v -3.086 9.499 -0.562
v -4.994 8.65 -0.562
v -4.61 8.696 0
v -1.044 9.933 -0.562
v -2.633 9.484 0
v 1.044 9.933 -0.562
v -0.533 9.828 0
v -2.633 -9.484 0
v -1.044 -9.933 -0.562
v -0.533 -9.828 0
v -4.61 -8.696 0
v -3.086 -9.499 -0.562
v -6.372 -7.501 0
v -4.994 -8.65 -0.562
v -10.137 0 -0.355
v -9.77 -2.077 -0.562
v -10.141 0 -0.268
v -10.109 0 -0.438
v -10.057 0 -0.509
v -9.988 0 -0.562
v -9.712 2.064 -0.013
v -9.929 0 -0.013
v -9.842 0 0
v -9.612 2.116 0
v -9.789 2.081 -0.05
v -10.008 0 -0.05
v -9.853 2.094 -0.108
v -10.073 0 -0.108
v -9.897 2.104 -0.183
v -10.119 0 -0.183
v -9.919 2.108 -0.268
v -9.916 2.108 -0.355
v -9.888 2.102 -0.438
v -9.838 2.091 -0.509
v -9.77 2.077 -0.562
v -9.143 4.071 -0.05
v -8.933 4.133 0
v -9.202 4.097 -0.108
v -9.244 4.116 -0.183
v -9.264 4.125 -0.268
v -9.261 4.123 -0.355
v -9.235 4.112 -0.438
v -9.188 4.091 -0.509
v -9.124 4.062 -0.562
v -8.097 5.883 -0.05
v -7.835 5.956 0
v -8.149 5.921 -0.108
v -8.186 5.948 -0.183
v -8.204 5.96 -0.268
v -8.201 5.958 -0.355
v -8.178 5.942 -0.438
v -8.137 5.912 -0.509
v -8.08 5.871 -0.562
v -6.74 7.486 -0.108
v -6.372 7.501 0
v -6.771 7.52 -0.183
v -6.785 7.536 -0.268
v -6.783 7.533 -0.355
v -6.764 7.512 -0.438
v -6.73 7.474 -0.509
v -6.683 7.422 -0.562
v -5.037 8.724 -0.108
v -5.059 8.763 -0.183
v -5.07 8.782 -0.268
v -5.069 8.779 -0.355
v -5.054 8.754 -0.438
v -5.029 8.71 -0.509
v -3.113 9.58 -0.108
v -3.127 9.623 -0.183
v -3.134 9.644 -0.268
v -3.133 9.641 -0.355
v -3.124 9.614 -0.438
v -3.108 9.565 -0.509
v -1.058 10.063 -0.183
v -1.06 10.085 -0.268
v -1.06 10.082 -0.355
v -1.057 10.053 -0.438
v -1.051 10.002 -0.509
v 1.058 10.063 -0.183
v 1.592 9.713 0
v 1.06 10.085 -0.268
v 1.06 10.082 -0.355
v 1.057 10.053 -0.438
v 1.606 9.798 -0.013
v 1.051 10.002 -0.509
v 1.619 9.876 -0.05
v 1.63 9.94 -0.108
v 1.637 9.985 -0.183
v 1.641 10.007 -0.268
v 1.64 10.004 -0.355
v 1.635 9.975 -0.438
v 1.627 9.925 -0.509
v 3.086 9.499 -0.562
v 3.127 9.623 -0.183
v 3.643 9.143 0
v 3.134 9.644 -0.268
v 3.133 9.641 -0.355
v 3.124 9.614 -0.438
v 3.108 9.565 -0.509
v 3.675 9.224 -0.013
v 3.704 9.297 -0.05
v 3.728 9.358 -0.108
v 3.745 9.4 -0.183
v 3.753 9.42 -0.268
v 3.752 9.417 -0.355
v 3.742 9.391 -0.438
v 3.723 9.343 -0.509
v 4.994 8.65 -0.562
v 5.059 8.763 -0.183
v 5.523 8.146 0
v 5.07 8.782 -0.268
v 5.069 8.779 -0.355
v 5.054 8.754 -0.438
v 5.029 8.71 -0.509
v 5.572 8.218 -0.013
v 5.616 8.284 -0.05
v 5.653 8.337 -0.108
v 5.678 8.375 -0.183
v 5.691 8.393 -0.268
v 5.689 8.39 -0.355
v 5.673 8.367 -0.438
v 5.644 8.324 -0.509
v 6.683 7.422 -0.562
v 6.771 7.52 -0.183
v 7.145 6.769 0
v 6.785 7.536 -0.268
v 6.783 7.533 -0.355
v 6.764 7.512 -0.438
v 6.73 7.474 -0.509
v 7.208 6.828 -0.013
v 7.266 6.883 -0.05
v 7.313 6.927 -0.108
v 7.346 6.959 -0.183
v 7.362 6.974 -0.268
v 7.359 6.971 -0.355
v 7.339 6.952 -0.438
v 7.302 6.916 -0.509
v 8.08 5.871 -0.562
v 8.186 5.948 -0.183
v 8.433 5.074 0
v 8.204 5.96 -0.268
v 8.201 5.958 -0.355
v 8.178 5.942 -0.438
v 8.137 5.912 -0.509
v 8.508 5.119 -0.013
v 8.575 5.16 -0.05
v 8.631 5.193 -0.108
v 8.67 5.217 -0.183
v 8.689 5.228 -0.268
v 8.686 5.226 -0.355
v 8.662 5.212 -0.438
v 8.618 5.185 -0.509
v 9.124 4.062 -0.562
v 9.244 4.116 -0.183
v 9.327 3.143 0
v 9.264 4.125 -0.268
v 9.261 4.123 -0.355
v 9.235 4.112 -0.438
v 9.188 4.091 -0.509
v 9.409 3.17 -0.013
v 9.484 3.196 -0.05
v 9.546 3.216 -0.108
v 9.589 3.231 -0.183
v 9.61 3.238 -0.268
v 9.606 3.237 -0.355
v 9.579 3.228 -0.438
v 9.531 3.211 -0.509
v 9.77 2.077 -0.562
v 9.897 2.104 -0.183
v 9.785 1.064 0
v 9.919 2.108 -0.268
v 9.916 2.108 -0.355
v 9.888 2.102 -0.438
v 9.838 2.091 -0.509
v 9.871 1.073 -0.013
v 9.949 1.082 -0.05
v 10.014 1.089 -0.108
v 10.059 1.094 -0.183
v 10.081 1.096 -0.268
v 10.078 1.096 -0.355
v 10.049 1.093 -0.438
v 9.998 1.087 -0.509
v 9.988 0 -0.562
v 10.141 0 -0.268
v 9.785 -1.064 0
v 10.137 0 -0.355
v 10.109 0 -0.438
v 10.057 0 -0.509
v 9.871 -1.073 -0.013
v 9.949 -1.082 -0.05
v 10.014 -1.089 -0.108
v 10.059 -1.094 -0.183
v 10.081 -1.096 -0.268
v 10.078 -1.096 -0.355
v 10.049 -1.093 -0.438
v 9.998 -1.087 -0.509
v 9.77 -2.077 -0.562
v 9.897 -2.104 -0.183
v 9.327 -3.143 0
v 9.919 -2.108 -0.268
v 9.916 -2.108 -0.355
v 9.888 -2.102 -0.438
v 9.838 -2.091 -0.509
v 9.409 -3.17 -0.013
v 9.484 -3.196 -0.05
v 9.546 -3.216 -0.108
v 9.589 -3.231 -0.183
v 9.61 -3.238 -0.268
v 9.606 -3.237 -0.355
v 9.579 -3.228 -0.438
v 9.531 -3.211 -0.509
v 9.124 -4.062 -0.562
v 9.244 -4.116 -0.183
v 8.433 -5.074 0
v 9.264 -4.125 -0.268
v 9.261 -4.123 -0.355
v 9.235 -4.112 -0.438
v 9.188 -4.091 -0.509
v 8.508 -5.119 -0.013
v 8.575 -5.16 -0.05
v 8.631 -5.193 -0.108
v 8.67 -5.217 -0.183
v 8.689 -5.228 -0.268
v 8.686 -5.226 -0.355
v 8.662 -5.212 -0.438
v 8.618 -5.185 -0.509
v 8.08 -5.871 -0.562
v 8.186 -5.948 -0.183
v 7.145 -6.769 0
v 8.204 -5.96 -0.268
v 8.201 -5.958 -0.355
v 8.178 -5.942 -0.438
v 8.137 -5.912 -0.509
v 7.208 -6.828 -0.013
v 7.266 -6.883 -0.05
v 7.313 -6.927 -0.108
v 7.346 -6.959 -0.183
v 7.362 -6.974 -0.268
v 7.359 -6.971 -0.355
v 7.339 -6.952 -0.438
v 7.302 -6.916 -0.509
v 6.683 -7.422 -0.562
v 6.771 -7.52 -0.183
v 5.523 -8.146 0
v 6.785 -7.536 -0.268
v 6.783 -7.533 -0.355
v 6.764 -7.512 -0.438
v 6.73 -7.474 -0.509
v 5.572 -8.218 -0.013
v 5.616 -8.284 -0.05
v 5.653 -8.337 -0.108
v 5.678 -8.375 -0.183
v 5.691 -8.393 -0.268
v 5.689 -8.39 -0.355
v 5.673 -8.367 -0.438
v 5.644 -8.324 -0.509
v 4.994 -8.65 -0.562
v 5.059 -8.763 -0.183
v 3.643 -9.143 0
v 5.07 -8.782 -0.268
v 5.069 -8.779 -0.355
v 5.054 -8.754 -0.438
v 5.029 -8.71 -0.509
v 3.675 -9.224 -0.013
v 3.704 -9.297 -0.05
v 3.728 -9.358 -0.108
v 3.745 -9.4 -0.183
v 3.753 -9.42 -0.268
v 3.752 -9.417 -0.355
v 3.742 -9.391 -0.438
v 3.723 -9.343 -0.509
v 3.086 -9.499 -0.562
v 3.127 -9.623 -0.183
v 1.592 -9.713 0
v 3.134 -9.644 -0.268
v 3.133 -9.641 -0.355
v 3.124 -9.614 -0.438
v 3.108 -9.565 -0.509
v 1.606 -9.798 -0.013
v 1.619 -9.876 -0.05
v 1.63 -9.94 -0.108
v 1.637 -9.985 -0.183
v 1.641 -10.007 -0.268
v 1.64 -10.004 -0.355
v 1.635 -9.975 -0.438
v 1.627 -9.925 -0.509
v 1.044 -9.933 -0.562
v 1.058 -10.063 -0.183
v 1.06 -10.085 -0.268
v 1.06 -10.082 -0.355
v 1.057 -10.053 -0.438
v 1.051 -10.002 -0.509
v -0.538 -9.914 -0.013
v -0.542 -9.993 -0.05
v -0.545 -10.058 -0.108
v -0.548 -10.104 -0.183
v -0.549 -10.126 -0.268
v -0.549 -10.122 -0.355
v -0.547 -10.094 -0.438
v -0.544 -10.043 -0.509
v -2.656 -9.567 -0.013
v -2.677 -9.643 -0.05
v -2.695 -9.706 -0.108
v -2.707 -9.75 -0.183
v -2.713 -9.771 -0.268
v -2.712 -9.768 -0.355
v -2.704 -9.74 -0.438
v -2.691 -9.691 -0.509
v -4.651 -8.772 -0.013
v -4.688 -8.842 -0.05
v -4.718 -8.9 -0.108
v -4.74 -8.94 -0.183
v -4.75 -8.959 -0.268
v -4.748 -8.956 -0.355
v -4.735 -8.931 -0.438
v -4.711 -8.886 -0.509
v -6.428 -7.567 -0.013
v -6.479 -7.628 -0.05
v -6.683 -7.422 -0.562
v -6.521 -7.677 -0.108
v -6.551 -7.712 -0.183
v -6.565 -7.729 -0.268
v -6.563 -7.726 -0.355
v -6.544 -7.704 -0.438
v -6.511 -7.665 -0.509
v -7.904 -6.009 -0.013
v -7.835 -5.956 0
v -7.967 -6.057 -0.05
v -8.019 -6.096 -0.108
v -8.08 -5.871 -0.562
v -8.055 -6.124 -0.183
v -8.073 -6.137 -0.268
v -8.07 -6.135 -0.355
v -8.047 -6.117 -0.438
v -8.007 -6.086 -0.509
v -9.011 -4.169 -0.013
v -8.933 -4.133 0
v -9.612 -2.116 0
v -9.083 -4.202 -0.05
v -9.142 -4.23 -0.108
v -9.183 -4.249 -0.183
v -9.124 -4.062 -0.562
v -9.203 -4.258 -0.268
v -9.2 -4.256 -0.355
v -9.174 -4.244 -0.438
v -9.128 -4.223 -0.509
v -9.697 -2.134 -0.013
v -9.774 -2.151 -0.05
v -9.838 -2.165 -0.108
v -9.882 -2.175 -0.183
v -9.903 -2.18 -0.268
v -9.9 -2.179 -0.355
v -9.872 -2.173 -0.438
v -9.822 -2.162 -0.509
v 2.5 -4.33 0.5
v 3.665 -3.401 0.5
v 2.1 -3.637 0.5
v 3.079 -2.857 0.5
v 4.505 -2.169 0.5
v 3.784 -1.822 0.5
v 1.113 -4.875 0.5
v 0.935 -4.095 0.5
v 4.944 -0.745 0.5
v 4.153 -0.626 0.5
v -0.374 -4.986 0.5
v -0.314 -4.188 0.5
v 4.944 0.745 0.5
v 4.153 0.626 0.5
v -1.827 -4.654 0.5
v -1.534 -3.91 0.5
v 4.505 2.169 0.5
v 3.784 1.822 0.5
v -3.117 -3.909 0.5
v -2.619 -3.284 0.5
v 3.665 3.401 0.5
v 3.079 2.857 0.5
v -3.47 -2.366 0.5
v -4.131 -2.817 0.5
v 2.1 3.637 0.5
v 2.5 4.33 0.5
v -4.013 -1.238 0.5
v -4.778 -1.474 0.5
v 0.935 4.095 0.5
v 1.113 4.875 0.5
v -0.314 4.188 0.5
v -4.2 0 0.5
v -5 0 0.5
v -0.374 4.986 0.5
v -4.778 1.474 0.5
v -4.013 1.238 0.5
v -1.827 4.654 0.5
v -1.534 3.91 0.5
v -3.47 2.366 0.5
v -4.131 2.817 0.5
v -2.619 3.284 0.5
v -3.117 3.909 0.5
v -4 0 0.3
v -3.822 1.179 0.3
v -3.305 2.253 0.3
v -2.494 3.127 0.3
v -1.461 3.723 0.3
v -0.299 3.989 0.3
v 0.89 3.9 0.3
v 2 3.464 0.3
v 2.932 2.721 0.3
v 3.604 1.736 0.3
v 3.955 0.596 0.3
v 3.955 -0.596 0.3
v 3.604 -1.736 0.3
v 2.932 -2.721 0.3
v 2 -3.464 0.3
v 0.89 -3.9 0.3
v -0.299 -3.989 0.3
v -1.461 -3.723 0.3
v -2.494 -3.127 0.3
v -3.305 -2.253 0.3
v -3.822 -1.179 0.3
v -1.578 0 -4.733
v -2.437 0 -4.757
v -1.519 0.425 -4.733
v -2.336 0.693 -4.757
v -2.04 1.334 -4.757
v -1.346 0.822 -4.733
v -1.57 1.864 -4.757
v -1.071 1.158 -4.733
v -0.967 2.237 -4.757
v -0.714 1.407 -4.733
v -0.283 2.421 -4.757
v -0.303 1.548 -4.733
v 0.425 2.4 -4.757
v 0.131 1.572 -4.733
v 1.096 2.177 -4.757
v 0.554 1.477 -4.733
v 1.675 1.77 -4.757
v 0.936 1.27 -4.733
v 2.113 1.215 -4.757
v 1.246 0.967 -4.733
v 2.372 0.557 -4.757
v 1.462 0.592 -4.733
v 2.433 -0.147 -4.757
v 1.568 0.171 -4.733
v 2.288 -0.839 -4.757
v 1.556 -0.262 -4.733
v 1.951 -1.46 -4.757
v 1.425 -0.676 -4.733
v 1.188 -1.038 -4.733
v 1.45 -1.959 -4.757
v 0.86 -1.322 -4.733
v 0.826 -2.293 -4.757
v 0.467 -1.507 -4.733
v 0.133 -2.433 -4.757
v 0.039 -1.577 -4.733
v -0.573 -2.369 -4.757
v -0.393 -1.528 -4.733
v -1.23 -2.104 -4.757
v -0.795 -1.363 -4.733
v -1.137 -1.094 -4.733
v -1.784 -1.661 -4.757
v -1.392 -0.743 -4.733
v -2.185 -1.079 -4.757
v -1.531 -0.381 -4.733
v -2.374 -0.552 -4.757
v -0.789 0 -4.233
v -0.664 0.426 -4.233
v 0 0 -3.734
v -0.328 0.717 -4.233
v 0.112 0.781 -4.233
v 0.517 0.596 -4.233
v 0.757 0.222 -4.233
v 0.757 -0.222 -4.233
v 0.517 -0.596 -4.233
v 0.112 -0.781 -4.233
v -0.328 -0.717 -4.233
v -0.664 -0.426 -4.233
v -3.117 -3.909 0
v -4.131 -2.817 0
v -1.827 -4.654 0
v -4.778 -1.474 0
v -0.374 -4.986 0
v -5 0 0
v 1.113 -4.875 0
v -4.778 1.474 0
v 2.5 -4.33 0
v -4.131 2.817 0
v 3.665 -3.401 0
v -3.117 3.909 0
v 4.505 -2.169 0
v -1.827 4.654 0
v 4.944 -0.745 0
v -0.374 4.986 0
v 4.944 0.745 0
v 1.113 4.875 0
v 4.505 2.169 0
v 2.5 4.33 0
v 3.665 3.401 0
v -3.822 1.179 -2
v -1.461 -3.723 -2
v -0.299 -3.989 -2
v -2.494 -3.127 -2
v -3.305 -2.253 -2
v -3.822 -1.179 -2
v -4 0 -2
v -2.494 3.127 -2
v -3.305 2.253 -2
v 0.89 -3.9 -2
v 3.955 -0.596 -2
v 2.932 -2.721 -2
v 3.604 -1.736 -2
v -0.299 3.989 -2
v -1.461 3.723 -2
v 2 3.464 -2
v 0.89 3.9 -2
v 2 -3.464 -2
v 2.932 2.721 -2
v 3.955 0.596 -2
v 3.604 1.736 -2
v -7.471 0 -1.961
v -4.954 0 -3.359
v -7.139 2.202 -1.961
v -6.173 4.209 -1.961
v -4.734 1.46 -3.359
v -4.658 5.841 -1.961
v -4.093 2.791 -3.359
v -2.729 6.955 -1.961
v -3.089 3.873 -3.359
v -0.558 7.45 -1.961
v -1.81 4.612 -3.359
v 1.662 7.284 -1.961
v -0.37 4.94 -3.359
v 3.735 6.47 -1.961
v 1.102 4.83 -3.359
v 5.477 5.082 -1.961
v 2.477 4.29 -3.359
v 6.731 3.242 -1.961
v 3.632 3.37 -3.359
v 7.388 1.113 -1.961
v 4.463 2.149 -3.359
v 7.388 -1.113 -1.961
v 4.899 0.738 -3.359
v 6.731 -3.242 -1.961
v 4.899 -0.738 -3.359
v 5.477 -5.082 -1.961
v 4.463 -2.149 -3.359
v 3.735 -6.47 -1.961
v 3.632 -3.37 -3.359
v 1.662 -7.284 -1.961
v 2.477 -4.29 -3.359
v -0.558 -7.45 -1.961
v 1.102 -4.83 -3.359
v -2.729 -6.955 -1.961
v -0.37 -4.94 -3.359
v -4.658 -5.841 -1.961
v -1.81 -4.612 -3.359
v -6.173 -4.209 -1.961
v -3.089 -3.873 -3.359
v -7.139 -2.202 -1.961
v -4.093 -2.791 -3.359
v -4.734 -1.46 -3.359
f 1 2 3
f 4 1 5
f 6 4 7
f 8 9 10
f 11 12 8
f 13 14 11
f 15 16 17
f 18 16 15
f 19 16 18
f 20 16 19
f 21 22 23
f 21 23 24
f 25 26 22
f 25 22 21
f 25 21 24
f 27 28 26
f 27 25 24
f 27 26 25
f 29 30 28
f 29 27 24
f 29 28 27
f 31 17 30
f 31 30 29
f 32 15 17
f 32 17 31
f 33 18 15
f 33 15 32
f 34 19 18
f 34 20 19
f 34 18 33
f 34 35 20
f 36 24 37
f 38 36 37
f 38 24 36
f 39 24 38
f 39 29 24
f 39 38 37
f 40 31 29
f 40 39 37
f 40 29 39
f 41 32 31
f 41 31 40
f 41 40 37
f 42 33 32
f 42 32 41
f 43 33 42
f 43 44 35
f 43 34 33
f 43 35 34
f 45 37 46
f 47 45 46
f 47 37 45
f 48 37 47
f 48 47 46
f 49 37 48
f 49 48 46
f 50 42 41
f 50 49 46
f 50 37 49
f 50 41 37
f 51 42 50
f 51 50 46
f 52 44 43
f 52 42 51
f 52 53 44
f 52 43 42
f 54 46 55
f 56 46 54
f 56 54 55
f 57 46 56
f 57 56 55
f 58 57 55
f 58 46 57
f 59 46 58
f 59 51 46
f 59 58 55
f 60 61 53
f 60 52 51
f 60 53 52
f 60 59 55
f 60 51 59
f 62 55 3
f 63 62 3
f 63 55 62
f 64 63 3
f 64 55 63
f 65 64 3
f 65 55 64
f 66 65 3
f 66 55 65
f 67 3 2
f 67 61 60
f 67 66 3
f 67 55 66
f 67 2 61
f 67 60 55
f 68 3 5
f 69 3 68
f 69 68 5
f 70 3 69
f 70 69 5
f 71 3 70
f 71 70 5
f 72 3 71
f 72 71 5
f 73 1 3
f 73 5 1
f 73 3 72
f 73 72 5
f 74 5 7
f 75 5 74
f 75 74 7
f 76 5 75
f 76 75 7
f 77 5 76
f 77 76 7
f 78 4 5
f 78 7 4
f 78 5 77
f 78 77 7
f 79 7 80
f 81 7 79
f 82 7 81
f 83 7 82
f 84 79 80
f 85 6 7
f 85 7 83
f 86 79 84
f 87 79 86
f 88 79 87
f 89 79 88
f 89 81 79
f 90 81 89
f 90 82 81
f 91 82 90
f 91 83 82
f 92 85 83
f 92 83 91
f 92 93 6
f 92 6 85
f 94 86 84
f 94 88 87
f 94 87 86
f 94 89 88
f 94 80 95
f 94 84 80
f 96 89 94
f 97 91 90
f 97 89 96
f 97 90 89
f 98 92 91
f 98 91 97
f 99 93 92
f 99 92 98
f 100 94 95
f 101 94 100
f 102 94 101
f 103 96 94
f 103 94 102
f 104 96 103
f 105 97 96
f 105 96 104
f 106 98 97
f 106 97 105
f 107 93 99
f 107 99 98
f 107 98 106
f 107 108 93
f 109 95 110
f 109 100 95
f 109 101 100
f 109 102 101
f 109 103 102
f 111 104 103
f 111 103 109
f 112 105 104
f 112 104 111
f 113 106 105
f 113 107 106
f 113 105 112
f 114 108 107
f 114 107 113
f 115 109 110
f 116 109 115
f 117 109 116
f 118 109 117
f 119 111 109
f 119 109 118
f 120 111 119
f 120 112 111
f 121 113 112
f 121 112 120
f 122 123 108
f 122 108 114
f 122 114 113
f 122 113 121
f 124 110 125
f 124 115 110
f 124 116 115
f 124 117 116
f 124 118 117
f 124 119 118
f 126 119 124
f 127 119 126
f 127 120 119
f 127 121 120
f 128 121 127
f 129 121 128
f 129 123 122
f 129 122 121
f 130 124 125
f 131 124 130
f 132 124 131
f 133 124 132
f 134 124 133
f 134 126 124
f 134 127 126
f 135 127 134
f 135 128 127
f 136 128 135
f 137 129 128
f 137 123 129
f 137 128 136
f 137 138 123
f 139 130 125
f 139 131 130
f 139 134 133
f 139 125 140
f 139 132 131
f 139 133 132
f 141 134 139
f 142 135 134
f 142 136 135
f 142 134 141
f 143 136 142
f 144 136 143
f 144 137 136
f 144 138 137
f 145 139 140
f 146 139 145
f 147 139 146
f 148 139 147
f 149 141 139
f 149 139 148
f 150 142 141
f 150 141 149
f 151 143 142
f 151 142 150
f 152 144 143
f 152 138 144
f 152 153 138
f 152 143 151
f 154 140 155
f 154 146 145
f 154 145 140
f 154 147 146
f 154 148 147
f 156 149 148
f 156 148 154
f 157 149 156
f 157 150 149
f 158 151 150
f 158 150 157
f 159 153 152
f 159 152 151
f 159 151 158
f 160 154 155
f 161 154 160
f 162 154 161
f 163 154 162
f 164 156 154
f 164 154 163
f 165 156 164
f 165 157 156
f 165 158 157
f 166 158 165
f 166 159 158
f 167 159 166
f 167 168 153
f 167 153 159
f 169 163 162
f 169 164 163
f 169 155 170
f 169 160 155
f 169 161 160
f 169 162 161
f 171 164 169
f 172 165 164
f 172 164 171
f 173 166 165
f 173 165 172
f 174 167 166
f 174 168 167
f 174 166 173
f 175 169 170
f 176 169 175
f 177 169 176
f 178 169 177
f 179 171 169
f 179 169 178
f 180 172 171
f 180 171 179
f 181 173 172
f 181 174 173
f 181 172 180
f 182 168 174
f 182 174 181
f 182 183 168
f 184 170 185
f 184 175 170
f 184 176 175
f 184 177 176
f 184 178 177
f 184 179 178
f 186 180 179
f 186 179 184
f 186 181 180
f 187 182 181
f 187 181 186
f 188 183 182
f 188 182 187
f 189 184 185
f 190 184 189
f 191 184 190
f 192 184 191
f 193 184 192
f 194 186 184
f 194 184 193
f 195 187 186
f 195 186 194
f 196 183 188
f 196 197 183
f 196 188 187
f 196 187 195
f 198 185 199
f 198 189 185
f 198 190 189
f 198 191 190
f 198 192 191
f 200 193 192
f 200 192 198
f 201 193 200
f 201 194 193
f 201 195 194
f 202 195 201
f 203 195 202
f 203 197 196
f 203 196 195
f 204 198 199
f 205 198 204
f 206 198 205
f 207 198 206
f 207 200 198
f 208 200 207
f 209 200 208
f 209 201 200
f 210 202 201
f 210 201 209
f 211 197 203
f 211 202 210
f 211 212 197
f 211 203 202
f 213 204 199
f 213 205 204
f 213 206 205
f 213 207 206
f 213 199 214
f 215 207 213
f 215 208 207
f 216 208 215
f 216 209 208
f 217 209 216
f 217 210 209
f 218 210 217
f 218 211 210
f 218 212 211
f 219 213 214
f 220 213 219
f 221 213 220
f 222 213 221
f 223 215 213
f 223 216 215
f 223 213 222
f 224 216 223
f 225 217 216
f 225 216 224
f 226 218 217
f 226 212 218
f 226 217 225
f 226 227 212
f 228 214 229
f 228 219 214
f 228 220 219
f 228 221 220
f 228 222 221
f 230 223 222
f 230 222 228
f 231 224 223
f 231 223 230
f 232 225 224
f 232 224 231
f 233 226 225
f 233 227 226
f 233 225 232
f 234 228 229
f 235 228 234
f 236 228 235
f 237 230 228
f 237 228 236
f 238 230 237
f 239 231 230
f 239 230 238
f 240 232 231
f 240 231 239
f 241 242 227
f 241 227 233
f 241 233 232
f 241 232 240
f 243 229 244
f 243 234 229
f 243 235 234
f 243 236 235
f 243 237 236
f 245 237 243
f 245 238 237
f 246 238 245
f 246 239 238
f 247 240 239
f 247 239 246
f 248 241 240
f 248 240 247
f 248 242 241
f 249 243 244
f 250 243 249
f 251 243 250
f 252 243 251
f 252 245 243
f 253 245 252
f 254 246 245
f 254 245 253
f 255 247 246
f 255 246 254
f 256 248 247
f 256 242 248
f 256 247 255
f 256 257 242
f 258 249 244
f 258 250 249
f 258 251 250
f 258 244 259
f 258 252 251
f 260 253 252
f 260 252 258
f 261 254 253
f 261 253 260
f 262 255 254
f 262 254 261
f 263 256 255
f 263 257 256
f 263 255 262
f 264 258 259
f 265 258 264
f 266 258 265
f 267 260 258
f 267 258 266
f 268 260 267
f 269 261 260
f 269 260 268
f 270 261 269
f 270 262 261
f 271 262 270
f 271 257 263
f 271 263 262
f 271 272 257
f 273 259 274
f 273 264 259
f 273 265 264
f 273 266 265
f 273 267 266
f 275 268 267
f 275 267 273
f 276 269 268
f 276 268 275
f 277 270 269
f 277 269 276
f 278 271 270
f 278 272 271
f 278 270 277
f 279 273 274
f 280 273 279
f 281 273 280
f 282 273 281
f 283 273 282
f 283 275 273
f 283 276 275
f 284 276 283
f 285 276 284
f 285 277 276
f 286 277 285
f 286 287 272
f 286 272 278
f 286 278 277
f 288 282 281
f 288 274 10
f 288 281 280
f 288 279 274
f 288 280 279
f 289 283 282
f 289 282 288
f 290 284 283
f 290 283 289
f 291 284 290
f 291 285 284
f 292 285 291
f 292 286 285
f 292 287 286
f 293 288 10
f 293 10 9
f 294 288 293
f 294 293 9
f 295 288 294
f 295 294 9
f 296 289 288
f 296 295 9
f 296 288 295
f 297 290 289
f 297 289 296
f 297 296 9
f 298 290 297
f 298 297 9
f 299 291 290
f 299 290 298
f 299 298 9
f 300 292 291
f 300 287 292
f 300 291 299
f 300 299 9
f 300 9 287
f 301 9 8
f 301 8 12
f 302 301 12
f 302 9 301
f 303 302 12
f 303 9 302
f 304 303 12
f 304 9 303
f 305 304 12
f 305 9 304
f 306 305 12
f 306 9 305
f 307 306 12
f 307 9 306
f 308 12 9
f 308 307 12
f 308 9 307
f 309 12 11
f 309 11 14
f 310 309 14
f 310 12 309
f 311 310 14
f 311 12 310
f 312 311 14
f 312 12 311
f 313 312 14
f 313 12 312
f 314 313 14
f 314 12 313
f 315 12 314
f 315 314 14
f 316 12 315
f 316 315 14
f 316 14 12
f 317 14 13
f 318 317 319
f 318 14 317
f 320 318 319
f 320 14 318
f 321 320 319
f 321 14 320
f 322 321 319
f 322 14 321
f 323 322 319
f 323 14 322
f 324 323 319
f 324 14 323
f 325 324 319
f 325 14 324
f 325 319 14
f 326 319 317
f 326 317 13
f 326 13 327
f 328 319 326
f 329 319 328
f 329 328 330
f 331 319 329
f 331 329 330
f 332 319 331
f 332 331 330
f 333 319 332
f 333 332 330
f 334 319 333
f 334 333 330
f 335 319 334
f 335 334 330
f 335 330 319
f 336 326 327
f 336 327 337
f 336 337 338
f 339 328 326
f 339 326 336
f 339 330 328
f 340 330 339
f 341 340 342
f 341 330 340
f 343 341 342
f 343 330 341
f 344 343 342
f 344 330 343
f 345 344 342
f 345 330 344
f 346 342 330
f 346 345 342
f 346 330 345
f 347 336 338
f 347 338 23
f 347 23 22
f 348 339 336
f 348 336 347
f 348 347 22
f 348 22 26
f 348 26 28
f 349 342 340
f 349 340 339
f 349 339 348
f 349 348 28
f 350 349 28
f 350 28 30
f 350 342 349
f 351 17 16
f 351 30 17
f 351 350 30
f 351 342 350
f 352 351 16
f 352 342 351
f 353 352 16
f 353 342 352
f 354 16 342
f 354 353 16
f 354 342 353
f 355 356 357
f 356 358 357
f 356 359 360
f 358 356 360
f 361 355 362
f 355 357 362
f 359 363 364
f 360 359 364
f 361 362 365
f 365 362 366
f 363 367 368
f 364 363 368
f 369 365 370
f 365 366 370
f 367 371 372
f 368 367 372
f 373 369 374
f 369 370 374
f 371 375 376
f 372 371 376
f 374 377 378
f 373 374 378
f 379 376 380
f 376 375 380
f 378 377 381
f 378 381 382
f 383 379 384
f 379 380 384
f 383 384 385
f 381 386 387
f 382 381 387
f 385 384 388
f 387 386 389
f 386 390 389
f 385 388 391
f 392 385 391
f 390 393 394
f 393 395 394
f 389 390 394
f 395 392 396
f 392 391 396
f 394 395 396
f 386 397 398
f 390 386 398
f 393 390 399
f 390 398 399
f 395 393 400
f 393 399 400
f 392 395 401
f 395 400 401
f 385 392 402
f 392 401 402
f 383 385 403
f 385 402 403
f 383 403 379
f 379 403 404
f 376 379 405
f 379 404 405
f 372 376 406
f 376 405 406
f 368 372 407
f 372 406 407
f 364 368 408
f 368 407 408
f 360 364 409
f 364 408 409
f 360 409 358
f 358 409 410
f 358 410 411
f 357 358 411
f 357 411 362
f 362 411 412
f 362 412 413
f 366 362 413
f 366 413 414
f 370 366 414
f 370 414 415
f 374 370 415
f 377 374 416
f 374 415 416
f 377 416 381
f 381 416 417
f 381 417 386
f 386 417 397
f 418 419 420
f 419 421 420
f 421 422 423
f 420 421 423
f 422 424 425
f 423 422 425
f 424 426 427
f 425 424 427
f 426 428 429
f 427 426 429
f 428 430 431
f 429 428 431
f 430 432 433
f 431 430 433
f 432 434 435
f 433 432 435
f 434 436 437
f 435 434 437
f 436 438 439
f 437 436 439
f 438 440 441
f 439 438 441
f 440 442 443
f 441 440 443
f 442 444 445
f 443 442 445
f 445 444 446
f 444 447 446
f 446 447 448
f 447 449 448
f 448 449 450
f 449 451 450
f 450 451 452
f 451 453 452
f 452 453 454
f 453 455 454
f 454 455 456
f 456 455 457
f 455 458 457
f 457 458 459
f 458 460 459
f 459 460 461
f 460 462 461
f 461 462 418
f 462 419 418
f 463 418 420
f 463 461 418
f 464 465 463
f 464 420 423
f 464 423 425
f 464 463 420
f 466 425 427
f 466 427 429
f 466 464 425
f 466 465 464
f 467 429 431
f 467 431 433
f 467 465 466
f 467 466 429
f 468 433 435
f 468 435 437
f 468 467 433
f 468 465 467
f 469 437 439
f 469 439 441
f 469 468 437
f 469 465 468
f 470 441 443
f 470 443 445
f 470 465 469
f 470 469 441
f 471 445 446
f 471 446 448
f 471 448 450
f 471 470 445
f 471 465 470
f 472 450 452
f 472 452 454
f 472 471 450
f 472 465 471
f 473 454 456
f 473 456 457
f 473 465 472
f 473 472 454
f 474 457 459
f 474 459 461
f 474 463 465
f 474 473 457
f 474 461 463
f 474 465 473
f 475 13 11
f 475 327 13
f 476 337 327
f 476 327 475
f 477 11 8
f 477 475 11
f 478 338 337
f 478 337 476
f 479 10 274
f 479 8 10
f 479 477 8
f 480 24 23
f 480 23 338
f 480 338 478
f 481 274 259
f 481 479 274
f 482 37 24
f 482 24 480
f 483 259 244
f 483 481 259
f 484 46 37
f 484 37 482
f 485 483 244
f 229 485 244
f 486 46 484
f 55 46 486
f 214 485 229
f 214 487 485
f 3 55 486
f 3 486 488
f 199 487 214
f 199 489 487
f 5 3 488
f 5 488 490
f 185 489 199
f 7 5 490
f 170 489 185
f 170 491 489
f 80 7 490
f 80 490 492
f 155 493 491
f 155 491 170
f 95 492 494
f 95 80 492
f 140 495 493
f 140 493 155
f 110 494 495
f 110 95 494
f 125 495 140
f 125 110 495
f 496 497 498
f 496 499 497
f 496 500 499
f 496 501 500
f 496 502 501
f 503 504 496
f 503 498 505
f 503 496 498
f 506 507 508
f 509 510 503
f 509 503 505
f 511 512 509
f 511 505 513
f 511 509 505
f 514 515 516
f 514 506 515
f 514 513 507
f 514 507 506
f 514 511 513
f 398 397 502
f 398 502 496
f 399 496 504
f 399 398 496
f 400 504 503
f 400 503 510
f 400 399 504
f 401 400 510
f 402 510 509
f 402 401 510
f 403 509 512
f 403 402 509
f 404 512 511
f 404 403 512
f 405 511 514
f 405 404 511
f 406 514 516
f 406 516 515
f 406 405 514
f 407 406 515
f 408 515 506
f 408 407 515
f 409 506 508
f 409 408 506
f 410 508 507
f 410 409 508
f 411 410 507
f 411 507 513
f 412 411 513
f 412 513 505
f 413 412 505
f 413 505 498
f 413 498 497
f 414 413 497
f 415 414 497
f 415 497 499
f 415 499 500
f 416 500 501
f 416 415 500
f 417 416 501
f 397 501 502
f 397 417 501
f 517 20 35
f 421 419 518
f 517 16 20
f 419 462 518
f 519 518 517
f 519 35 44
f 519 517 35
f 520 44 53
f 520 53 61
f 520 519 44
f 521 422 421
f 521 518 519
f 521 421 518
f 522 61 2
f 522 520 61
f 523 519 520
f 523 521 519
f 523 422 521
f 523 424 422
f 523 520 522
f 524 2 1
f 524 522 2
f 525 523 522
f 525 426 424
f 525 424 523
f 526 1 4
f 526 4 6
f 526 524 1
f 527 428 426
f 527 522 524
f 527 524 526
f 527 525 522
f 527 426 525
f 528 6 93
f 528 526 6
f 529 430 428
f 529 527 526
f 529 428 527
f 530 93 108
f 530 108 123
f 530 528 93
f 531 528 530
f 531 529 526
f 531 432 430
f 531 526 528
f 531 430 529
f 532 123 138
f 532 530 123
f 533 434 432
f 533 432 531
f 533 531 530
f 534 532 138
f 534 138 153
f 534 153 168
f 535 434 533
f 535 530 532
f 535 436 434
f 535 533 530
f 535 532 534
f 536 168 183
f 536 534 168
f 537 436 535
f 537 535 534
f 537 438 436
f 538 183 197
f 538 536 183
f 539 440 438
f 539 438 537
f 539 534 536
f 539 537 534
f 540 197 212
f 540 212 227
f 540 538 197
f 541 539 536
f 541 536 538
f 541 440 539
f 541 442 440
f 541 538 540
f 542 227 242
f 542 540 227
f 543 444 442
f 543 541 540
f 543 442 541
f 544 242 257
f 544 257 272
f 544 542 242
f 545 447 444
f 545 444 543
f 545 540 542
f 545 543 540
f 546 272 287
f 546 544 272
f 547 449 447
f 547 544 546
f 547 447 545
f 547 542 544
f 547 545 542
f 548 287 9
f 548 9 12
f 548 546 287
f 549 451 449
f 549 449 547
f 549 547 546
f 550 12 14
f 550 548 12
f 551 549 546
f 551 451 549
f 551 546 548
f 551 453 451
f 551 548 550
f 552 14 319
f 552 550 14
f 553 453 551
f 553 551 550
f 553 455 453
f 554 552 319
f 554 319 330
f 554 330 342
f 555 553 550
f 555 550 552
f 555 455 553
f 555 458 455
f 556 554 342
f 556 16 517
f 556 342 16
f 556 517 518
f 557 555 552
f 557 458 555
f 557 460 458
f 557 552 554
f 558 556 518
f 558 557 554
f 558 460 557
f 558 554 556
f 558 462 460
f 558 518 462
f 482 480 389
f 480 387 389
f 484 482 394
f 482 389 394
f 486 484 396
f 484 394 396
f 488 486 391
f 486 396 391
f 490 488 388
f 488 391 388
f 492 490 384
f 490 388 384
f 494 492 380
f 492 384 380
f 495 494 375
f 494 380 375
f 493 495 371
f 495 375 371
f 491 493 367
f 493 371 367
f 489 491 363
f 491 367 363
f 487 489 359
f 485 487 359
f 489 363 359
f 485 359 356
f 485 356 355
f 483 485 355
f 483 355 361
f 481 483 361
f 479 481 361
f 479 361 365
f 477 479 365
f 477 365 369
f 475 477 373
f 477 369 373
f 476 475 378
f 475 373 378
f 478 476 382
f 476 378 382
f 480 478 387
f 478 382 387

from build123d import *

# Parameters (mm, degrees)
F0_W    = 1
F0_H    = 0.5
F2_R    = 0.3
F3_SIZE = 0.5
F4_SIZE = 0.2


with BuildPart() as f1:
    # F0 (on Front) → F1 (revolve)
    with BuildSketch(Plane.XZ):
        Polygon((-4, -2), (-4, 0), (-5, 0), (-11, 0), (-2, -5), (0, -3.733945), (0, -2), align=None)
        with Locations((-4.5, 0.25)):
            Rectangle(F0_W, F0_H)
    revolve(axis=Axis((0, 0, -1.866972), (0, 0, -1)))

    # F2
    f2_edges = [f1.edges().sort_by_distance(p)[0] for p in [
        (11, 0, 0),
    ]]
    fillet(f2_edges, radius=F2_R)

    # F3
    f3_edges = [f1.edges().sort_by_distance(p)[0] for p in [
        (2, 0, -5),
    ]]
    chamfer(f3_edges, length=F3_SIZE)

    # F4
    f4_edges = [f1.edges().sort_by_distance(p)[0] for p in [
        (4, 0, 0.5),
    ]]
    chamfer(f4_edges, length=F4_SIZE)


solid = f1.part
